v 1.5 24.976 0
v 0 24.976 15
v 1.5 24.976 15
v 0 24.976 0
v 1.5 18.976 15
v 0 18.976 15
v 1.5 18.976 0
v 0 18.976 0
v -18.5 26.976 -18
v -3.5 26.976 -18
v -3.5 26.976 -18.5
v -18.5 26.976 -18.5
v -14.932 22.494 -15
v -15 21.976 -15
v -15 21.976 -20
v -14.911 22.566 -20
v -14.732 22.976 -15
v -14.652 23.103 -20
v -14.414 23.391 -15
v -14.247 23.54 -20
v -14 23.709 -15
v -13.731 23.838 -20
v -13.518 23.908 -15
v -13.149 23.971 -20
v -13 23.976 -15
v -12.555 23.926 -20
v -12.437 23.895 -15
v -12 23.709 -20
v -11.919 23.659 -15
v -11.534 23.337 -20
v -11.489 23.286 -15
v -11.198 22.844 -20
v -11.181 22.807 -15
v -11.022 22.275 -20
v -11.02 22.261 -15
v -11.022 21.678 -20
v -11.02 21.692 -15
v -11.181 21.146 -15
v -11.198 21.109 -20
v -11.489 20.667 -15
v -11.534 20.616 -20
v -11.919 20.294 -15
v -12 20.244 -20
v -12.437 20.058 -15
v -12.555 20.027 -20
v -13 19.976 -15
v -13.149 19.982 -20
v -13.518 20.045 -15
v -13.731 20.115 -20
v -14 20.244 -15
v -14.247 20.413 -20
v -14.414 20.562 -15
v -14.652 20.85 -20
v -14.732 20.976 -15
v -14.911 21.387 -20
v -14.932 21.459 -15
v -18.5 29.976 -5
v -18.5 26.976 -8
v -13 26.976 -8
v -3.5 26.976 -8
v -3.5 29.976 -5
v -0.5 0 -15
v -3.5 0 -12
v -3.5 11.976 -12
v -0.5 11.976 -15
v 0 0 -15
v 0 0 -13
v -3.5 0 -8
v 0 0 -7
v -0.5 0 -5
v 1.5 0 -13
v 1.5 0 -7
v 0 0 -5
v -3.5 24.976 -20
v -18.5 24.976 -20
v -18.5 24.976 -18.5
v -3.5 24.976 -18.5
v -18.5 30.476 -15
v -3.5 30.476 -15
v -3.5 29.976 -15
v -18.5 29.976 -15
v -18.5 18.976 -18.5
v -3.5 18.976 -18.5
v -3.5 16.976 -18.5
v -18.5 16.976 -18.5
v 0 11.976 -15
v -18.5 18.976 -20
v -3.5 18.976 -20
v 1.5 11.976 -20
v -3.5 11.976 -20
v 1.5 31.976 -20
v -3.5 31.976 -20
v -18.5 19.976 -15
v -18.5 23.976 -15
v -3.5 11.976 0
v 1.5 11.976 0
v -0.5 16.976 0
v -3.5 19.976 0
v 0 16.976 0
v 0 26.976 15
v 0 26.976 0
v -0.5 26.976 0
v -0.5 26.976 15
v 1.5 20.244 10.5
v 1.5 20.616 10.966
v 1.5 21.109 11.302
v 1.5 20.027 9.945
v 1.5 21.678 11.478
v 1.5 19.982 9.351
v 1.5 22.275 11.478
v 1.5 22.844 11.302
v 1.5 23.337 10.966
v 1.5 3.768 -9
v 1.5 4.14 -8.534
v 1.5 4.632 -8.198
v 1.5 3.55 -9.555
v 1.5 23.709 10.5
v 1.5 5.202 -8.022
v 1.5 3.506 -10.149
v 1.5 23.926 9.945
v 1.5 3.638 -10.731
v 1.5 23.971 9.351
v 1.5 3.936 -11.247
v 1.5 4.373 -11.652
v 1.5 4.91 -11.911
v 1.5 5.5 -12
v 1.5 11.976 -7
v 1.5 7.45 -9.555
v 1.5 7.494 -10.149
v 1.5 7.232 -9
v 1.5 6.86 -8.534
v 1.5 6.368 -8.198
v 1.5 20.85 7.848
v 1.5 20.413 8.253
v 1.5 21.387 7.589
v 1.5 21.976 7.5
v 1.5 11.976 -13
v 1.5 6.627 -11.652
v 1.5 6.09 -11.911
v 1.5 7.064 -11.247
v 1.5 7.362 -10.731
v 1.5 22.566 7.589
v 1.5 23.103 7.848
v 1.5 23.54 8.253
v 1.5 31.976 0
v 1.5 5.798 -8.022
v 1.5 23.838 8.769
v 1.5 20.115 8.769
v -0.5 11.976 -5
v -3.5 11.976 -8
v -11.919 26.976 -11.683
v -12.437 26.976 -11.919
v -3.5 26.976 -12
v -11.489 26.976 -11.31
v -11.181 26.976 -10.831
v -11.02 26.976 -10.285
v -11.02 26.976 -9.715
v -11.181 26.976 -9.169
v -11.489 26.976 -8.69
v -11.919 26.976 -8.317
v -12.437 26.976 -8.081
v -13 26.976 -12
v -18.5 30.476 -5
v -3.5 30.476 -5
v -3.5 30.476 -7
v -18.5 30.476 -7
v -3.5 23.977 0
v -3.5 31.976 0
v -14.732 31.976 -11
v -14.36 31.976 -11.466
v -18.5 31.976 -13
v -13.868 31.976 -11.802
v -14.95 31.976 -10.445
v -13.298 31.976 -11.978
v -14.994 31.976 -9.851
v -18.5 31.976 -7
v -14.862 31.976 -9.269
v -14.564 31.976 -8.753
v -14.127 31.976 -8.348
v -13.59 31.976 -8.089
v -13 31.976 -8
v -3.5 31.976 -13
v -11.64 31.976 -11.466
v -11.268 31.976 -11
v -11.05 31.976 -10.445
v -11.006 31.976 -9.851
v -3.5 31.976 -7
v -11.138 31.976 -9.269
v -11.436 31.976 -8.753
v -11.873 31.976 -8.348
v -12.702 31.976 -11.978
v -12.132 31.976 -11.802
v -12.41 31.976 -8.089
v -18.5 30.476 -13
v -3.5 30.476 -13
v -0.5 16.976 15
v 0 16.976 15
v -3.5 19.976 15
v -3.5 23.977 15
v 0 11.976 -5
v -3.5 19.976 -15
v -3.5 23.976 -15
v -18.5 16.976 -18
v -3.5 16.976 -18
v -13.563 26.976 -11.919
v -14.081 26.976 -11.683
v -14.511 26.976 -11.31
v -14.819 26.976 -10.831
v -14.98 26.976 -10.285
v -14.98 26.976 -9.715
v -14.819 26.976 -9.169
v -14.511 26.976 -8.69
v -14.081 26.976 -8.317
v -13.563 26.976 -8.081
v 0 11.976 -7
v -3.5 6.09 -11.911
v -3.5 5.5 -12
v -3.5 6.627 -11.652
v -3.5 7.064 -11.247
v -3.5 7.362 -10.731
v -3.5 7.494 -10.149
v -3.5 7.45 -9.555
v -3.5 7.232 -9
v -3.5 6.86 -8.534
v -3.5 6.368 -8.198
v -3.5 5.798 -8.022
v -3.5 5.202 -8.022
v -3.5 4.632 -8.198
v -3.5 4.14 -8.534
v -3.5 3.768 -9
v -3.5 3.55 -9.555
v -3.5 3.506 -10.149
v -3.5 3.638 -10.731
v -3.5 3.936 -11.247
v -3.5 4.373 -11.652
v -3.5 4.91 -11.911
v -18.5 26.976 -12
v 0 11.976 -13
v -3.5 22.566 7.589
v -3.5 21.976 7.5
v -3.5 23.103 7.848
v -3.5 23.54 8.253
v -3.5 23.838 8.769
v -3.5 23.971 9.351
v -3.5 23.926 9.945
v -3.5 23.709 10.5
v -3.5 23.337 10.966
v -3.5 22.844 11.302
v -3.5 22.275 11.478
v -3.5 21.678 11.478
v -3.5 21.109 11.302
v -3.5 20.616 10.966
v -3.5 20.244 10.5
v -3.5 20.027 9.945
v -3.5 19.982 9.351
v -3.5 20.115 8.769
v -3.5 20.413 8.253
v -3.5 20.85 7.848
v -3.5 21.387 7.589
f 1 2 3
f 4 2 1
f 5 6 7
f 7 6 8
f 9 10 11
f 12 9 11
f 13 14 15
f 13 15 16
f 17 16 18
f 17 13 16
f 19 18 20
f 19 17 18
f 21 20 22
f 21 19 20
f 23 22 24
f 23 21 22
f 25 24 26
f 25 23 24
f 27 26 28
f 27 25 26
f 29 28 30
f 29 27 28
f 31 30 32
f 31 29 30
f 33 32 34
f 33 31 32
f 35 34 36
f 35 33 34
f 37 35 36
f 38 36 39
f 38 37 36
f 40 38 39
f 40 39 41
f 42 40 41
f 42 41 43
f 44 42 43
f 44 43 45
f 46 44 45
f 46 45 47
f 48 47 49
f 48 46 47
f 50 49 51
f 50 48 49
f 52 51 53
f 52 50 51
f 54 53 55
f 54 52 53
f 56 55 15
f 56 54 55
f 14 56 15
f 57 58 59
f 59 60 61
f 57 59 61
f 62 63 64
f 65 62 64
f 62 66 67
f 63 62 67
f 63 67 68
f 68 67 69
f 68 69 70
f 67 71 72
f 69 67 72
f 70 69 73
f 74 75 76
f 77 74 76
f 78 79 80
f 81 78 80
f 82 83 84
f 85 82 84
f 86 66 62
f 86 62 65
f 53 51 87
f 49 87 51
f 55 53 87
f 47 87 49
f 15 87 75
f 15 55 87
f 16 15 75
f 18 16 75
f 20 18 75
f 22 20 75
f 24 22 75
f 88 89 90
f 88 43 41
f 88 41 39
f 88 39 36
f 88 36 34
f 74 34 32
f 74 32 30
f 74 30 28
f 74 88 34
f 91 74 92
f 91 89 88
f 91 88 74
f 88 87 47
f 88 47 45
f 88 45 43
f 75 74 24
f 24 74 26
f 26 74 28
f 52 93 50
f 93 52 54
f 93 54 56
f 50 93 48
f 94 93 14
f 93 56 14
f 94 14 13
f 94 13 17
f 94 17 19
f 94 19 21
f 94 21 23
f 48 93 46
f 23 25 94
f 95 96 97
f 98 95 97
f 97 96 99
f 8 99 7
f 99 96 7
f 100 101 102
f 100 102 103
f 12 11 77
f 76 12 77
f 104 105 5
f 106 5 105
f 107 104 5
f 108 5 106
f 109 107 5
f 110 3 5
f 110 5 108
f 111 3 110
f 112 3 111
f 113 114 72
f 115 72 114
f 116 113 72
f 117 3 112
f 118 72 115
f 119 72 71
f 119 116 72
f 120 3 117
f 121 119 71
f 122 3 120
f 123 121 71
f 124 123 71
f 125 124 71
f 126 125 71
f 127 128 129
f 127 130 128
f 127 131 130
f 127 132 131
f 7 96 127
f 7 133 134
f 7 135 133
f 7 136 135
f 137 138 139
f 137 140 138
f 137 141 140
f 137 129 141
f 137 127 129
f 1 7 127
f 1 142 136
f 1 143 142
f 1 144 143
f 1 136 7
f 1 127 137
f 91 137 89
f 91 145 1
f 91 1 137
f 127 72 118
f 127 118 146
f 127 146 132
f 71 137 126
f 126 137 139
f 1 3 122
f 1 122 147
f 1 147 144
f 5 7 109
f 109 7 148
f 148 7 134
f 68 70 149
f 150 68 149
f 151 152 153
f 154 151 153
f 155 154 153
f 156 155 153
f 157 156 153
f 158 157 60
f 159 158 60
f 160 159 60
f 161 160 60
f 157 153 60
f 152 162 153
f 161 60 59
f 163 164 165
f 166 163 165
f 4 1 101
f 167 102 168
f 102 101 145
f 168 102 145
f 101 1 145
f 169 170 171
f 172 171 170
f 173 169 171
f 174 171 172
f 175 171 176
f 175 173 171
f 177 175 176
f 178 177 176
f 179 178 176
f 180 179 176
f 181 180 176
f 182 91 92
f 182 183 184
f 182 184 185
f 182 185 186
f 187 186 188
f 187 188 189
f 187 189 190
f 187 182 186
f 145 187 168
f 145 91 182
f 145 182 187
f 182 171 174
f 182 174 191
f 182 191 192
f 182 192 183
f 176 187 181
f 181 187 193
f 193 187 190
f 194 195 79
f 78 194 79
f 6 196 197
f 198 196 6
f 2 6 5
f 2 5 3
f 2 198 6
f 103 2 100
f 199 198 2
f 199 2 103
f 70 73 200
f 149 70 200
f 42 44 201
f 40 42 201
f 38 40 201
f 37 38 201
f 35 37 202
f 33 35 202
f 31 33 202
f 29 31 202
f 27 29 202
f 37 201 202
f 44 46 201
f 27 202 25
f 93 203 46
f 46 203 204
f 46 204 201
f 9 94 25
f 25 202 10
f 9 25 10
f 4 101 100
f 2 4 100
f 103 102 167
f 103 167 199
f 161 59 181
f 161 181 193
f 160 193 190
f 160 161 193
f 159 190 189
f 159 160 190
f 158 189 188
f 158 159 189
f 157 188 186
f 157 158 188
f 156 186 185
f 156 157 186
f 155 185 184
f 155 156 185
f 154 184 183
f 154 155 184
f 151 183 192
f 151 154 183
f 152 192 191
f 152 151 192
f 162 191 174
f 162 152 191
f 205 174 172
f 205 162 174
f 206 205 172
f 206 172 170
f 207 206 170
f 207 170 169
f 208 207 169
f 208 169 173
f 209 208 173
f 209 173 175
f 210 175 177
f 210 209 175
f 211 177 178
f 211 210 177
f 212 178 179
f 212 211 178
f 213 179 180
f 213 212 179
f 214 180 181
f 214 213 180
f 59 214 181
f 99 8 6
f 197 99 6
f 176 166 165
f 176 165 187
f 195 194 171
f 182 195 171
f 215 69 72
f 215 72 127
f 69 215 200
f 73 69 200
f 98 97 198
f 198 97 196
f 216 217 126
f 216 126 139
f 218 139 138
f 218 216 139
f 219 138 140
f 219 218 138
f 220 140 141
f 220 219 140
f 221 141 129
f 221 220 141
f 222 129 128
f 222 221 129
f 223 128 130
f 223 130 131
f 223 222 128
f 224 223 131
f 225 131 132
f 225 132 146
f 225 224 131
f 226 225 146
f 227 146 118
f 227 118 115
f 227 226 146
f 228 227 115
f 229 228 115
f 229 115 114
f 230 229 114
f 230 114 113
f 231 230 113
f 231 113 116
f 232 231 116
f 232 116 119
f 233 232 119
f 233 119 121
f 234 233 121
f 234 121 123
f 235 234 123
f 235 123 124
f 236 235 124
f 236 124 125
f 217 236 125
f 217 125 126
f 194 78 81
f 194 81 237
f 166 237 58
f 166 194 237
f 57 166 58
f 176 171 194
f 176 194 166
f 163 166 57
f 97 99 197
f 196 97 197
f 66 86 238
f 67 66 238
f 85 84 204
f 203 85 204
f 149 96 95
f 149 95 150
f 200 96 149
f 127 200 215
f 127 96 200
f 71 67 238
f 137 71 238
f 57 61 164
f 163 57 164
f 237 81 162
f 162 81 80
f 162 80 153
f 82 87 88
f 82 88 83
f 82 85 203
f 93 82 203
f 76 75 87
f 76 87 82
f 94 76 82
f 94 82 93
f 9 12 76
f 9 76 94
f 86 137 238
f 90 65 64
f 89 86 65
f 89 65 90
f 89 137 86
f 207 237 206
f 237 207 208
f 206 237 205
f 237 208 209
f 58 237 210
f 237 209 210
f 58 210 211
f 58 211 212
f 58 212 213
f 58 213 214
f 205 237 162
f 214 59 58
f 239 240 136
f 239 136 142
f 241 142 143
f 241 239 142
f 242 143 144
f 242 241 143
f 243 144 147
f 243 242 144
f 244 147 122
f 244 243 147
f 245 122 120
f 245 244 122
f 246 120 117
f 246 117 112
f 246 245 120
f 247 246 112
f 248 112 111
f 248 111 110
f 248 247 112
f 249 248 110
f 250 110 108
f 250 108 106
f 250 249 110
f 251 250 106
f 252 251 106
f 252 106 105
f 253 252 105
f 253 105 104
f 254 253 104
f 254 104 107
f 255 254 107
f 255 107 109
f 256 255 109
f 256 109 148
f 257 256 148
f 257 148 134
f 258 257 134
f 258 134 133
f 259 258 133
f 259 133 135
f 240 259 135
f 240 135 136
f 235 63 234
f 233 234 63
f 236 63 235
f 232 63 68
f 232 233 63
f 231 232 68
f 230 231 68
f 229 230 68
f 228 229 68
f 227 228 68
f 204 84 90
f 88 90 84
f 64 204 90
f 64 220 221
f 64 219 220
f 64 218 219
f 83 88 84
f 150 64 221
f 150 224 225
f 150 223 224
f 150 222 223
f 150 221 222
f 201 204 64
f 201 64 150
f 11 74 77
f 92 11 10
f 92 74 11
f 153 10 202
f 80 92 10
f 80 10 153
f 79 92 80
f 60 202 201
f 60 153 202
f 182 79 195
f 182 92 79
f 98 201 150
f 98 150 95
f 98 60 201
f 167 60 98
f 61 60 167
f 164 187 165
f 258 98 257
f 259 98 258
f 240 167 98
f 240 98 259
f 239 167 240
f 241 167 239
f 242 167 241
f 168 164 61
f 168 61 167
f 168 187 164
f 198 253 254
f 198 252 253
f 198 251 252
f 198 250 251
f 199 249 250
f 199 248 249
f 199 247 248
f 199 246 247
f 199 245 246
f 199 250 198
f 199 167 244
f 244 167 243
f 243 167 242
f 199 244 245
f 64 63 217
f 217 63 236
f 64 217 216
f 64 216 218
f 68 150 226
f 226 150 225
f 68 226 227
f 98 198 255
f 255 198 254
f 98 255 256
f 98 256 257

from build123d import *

# Parameters (mm, degrees)
SKETCH1_W               = 20
SKETCH1_H               = 20
SKETCH1_W_2             = 15
SKETCH1_H_2             = 6
SKETCH1_R               = 2
SKETCH1_W_3             = 6
SKETCH1_H_3             = 11.976495928
BOSS_EXTRUDE2_DEPTH     = 1.5
BOSS_EXTRUDE3_DEPTH     = 3.5
SKETCH3_W               = 10
SKETCH3_H               = 11.976495928
SKETCH3_W_2             = 15
SKETCH3_H_2             = 10
BOSS_EXTRUDE4_DEPTH     = 3.5
CUT_EXTRUDE1_DEPTH      = 38.878044984
CUT_EXTRUDE1_DEPTH_BACK = 38.878044984
SKETCH5_R               = 2
SKETCH6_W               = 1.5
SKETCH6_H               = 6
SKETCH6_W_2             = 6
SKETCH6_H_2             = 1.5
BOSS_EXTRUDE6_DEPTH     = 15
CHAMFER1_SIZE           = 3
CUT_EXTRUDE4_DEPTH      = 43.008883487
CUT_EXTRUDE4_DEPTH_BACK = 43.008883487
SKETCH7_R               = 2
CUT_EXTRUDE5_DEPTH      = 51.889549928
CUT_EXTRUDE5_DEPTH_BACK = 51.889549928
SKETCH8_R               = 2


with BuildPart() as part:
    # Sketch1 → Boss-Extrude2 (new body)
    # profile 1 of 3: a face of its own
    with BuildSketch(Plane(origin=(0, 0, 0), x_dir=(0, 0, -1), z_dir=(1, 0, 0))):
        with Locations((10, 21.976495928)):
            Rectangle(SKETCH1_W, SKETCH1_H)
    # profile 2 of 3: a face of its own
    with BuildSketch(Plane(origin=(0, 0, 0), x_dir=(0, 0, -1), z_dir=(1, 0, 0))):
        with Locations((-7.5, 21.976495928)):
            Rectangle(SKETCH1_W_2, SKETCH1_H_2)
        with Locations((-9.5, 21.976495928)):
            Circle(SKETCH1_R, mode=Mode.SUBTRACT)
    # profile 3 of 3: a face of its own
    with BuildSketch(Plane(origin=(0, 0, 0), x_dir=(0, 0, -1), z_dir=(1, 0, 0))):
        with Locations((10, 5.988247964)):
            Rectangle(SKETCH1_W_3, SKETCH1_H_3)
        with Locations((10, 5.5)):
            Circle(SKETCH1_R, mode=Mode.SUBTRACT)
    extrude(amount=BOSS_EXTRUDE2_DEPTH)

    # Sketch2 → Boss-Extrude3 (add)
    with BuildSketch(Plane.ZY):
        Polygon((-20, 31.976495928), (0, 31.976495928), (0, 24.976495928), (0, 11.976495928), (-20, 11.976495928), align=None)
    extrude(amount=BOSS_EXTRUDE3_DEPTH)

    # Sketch3 → Boss-Extrude4 (add)
    with BuildSketch(Plane.ZY):
        with Locations((-10, 5.988247964)):
            Rectangle(SKETCH3_W, SKETCH3_H)
        with Locations((7.5, 21.976495928)):
            Rectangle(SKETCH3_W_2, SKETCH3_H_2)
    extrude(amount=BOSS_EXTRUDE4_DEPTH)

    # Sketch5 → Cut-Extrude1 (cut, two sides: drawn at the far end of the back side and taken through both)
    with BuildSketch(Plane(origin=(0, 0, 0), x_dir=(0, 0, -1), z_dir=(1, 0, 0)).offset(-CUT_EXTRUDE1_DEPTH_BACK)):
        with Locations((-9.5, 21.976495928)):
            Circle(SKETCH5_R)
        with Locations((10, 5.5)):
            Circle(SKETCH5_R)
    extrude(amount=CUT_EXTRUDE1_DEPTH + CUT_EXTRUDE1_DEPTH_BACK, mode=Mode.SUBTRACT)

    # Sketch6 → Boss-Extrude6 (add)
    with BuildSketch(Plane.ZY.offset(3.5)):
        Polygon((-18.5, 26.976495928), (-18.5, 24.976495928), (-18.5, 18.976495928), (-18.5, 16.976495928), (-18, 16.976495928), (-15, 19.976495928), (-15, 23.976495928), (-18, 26.976495928), align=None)
        with Locations((-19.25, 21.976495928)):
            Rectangle(SKETCH6_W, SKETCH6_H)
        Polygon((-5, 29.976495928), (-5, 30.476495928), (-7, 30.476495928), (-13, 30.476495928), (-15, 30.476495928), (-15, 29.976495928), (-12, 26.976495928), (-8, 26.976495928), align=None)
        with Locations((-10, 31.226495928)):
            Rectangle(SKETCH6_W_2, SKETCH6_H_2)
    extrude(amount=BOSS_EXTRUDE6_DEPTH)

    # Chamfer1
    chamfer1_edges = [part.edges().sort_by_distance(p)[0] for p in [
        (-3.5, 5.988247964, -15),
        (-3.5, 5.988247964, -5),
        (-3.5, 16.976495928, 7.5),
        (-3.5, 26.976495928, 7.5),
    ]]
    chamfer(chamfer1_edges, length=CHAMFER1_SIZE - 0.0001)  # a hair under: the kernel refuses the full size

    # Sketch7 → Cut-Extrude4 (cut, two sides: drawn at the far end of the back side and taken through both)
    with BuildSketch(Plane(origin=(0, 31.976495928, 0), x_dir=(1, 0, 0), z_dir=(0, 1, 0)).offset(-CUT_EXTRUDE4_DEPTH_BACK)):
        with Locations(Location((-13, 10, 0), (0, 0, 270))):
            Circle(SKETCH7_R)
    extrude(amount=CUT_EXTRUDE4_DEPTH + CUT_EXTRUDE4_DEPTH_BACK, mode=Mode.SUBTRACT)

    # Sketch8 → Cut-Extrude5 (cut, two sides: drawn at the far end of the back side and taken through both)
    with BuildSketch(Plane(origin=(0, 0, -20), x_dir=(-1, 0, 0), z_dir=(0, 0, -1)).offset(-CUT_EXTRUDE5_DEPTH_BACK)):
        with Locations((13, 21.976495928)):
            Circle(SKETCH8_R)
    extrude(amount=CUT_EXTRUDE5_DEPTH + CUT_EXTRUDE5_DEPTH_BACK, mode=Mode.SUBTRACT)


solid = part.part
